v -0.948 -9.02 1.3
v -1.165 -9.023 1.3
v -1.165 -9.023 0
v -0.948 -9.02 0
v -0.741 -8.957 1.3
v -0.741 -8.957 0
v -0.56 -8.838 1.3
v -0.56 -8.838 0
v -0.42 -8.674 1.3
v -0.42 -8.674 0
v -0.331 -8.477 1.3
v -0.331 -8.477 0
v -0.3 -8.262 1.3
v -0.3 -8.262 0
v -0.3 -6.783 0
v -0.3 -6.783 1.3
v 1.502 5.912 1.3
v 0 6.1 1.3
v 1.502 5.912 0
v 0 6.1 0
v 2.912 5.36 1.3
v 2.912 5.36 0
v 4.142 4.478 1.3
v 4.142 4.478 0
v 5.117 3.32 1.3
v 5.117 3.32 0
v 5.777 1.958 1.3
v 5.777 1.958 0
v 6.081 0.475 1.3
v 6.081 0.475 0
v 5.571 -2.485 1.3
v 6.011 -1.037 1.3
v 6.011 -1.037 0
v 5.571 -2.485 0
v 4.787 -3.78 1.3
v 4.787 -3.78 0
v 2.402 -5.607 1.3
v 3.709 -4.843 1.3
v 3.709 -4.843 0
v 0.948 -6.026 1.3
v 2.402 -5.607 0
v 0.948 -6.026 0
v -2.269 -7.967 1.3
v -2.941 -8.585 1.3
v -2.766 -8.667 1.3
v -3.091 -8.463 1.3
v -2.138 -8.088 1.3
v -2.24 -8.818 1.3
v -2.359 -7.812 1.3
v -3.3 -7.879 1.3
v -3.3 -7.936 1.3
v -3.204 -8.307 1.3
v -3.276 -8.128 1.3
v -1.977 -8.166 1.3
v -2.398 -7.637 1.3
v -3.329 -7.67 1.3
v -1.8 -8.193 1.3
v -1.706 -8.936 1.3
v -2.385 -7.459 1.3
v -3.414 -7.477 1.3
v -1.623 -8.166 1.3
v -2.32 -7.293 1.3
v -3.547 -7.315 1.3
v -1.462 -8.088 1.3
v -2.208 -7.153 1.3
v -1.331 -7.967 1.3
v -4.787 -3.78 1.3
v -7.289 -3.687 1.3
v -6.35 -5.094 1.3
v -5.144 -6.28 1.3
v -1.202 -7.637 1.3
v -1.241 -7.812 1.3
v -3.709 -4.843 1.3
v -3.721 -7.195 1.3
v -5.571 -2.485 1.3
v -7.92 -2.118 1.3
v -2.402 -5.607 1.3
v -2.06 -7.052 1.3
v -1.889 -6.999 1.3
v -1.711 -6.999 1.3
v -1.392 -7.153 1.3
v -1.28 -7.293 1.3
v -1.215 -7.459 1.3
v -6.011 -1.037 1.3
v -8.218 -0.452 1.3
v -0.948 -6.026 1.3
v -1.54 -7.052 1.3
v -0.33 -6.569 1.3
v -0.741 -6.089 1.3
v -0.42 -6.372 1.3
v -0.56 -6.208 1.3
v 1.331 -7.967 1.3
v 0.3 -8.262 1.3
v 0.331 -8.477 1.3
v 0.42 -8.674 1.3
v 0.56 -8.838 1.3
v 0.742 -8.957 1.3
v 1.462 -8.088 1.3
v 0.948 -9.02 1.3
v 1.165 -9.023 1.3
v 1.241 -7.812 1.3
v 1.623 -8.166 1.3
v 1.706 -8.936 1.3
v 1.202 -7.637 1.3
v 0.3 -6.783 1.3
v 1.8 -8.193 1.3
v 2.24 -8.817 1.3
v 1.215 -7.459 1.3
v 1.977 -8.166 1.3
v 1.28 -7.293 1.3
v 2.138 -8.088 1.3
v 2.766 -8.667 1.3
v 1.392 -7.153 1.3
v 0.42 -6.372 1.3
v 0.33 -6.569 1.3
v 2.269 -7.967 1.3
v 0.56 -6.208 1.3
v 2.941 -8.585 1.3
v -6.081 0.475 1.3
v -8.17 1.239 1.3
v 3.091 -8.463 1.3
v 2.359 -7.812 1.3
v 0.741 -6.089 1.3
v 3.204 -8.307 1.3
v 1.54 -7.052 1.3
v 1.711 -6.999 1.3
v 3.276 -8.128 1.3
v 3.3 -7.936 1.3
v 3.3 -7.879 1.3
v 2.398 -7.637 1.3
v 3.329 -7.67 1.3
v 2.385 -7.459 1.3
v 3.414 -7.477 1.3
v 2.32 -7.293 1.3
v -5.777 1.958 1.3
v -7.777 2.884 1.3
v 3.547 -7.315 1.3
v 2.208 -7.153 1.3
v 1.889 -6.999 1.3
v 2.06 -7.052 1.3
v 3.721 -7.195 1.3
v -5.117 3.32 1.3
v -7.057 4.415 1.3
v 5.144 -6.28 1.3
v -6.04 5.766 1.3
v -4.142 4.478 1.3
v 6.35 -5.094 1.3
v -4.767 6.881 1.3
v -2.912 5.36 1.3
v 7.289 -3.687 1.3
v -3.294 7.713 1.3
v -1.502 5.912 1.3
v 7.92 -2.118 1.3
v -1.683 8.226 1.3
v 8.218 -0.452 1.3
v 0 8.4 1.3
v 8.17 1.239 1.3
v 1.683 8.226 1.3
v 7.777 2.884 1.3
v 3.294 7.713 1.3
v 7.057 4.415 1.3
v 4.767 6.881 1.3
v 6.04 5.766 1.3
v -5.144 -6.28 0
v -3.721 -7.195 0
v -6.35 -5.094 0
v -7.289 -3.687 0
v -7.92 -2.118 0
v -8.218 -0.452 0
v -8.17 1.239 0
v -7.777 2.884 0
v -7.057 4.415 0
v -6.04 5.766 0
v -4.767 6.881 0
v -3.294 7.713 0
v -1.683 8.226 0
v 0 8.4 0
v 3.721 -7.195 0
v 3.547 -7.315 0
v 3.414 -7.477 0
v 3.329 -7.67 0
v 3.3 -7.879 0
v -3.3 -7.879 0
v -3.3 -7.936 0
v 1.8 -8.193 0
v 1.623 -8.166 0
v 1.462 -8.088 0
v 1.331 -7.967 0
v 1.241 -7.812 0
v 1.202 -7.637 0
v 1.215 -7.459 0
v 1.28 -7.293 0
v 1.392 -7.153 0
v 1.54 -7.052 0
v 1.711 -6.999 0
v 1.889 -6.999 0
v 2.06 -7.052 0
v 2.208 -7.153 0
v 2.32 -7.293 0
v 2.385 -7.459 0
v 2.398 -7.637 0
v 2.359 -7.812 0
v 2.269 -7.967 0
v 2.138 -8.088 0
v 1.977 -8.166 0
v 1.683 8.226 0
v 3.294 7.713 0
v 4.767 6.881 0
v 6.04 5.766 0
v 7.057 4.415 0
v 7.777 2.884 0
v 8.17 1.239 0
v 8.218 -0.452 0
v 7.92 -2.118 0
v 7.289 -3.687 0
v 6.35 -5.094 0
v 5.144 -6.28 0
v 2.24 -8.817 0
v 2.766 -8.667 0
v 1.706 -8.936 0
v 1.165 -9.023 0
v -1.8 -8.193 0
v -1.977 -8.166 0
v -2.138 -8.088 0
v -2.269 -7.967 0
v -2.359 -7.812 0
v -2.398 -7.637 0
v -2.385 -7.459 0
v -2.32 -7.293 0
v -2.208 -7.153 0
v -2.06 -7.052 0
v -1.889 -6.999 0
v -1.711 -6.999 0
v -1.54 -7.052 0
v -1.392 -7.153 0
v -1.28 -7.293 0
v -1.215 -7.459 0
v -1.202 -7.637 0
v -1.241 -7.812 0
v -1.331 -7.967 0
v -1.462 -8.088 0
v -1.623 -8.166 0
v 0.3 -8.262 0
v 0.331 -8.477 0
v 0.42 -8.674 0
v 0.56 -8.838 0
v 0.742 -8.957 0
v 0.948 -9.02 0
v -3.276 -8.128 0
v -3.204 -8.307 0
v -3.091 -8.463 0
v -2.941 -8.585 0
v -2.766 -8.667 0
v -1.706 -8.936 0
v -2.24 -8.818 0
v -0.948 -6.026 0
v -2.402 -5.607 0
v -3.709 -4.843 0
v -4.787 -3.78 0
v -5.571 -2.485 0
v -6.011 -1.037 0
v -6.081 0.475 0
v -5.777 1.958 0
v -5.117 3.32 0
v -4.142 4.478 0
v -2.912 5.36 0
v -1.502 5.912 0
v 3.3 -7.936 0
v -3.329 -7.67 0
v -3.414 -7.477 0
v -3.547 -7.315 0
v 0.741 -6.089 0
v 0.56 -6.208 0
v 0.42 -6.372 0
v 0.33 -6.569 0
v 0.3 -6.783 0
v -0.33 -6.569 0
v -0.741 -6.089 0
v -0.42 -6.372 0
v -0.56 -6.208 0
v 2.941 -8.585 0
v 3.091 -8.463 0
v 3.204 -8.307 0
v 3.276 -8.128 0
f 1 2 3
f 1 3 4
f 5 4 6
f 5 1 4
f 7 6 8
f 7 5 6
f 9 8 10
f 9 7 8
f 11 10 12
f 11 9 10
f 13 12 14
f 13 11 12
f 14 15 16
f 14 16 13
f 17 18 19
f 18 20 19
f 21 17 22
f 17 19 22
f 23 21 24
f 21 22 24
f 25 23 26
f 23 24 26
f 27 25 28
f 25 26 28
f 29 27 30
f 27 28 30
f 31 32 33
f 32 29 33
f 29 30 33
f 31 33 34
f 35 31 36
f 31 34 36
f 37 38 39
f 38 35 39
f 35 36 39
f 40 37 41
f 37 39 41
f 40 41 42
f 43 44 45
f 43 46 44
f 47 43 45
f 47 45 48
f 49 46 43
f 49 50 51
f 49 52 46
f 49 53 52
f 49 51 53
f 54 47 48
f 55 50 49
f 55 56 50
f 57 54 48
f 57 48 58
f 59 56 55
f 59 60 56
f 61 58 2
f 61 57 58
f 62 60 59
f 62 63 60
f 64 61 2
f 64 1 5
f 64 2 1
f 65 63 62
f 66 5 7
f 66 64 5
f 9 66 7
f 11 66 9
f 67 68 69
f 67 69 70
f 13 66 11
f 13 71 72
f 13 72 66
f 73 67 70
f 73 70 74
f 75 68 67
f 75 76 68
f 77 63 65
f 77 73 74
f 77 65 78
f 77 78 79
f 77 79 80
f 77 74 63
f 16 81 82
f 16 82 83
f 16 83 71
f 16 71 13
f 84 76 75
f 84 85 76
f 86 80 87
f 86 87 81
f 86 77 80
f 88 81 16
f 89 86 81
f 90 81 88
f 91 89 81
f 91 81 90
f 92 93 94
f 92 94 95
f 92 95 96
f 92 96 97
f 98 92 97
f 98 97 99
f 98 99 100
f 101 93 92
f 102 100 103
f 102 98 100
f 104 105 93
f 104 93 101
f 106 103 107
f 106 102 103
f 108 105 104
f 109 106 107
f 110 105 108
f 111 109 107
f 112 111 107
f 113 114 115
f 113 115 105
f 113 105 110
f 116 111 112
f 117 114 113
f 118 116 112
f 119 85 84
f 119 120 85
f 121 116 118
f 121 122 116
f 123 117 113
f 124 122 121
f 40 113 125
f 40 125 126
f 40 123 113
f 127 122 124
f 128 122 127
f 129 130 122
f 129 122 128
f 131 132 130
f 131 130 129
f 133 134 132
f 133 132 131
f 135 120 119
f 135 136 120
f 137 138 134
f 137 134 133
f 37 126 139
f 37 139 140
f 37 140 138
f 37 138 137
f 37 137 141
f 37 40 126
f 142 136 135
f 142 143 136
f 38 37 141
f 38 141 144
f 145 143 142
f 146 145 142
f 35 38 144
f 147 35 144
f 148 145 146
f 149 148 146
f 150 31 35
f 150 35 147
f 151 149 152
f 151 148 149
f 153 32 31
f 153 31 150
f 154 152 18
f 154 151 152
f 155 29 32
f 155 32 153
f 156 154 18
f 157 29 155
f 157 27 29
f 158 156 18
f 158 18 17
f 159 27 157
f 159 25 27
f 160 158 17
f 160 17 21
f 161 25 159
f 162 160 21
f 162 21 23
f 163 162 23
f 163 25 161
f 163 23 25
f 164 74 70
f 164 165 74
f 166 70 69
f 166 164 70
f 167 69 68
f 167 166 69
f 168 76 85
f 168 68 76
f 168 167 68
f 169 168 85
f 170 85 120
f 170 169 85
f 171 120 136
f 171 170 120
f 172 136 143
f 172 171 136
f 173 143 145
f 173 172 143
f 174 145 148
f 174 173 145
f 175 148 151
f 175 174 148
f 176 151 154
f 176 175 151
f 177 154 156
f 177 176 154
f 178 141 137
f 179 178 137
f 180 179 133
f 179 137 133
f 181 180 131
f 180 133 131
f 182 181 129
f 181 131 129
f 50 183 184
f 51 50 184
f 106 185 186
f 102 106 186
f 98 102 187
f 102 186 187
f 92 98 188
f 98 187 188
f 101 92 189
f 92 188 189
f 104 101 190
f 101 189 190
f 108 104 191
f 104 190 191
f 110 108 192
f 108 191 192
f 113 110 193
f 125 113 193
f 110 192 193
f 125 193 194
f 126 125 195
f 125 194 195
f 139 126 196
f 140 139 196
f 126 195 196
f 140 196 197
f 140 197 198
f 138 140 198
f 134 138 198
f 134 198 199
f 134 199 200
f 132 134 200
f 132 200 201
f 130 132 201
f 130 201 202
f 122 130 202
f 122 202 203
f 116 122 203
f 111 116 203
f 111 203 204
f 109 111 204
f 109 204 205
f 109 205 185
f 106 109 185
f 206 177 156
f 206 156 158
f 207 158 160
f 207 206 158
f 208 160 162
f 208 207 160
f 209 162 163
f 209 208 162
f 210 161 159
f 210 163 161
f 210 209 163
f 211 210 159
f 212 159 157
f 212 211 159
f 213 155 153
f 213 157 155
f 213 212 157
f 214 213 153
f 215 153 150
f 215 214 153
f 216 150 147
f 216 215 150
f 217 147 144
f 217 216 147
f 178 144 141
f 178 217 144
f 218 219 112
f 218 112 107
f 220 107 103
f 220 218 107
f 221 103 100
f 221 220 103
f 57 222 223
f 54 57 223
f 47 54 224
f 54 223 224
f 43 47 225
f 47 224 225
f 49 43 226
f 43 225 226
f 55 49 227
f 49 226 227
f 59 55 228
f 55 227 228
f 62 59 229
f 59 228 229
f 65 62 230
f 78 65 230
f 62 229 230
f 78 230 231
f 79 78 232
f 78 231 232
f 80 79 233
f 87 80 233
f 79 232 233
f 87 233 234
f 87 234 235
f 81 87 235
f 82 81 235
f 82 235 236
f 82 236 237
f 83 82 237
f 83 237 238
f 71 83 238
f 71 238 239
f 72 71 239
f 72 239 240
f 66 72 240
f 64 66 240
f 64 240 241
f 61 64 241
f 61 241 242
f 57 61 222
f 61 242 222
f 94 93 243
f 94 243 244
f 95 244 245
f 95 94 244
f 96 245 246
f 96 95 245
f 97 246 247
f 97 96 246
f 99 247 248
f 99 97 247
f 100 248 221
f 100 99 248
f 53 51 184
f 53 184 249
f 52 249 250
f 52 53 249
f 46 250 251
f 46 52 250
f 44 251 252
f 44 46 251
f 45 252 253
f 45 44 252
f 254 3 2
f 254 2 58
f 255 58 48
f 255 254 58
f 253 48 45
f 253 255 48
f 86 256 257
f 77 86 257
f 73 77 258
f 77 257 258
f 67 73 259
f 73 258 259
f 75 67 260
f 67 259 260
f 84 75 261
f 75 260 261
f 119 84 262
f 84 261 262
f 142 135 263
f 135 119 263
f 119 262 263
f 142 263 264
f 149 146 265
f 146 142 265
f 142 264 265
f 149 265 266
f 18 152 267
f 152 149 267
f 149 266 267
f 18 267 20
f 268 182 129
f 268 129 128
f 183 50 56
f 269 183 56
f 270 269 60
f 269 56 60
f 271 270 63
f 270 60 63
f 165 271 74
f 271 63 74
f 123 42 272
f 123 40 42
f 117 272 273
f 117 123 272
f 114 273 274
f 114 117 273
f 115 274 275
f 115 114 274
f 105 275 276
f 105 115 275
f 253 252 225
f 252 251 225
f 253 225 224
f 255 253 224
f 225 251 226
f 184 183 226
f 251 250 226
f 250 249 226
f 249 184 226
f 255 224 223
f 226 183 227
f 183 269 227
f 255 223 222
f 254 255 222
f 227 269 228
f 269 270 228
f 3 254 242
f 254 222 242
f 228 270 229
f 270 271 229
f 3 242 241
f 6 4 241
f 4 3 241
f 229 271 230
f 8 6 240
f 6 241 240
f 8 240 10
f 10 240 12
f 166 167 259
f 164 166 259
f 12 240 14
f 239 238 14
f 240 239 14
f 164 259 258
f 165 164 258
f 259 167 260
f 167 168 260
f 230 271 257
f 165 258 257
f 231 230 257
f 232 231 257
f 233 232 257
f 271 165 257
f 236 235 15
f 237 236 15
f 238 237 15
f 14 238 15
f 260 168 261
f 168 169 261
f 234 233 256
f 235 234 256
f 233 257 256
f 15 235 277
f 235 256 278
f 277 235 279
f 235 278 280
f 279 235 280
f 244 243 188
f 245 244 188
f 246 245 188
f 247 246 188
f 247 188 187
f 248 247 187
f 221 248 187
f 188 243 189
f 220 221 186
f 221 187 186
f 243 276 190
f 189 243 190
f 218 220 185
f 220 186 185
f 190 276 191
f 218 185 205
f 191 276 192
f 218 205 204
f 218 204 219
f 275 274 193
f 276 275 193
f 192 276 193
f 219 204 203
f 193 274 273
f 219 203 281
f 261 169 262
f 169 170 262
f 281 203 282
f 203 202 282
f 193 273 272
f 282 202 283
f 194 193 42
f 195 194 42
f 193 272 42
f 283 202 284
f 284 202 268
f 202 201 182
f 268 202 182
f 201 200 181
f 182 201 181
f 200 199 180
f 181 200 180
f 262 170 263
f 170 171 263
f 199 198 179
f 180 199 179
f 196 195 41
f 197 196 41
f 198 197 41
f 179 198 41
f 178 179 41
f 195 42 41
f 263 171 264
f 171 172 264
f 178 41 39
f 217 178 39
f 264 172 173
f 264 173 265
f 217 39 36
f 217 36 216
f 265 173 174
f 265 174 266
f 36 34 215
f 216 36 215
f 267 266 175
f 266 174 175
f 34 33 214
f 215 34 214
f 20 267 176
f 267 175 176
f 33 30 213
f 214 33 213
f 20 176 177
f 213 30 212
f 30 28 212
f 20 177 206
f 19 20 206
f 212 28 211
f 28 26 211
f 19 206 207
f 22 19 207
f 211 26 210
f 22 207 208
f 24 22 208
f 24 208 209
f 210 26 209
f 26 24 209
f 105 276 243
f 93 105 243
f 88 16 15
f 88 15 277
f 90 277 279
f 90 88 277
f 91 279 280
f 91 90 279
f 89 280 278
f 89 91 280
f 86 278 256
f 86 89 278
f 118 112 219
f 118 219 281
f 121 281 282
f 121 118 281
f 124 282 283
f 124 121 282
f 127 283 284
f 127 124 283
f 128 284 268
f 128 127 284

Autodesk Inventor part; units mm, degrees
ref_plane "YZ Plane" through (0, 0, 0) normal (1, 0, 0) x (0, 1, 0)
ref_plane "XZ Plane" through (0, 0, 0) normal (0, 1, 0) x (-1, 0, 0)
ref_plane "XY Plane" through (0, 0, 0) normal (0, 0, 1) x (1, 0, 0)
sketch "Sketch1" plane through (0, 0, 0) normal (0, 0, 1) x (1, 0, 0)
  arc A0 (0, 6.1) -> (-0.3, -6.0926) centre (0, 0) ccw
  line L0 (0, -10.4012) -> (0, 10.52) projected
  line L1 (-0.3, -6.0926) -> (-0.3, -9.0926)
  arc A1 (-3.3, -8.478) -> (-0.3, -9.0926) centre (0, 0) ccw
  arc A2 (0, 8.4) -> (-3.3, -7.3926) centre (0, 0.1589) ccw
  line L2 (-3.3, -7.3926) -> (-3.3, -8.478)
  line L3 (0, 8.4) -> (0, 6.1)
  arc A3 (0.3, -6.0926) -> (0, 6.1) centre (0, 0) ccw
  line L4 (0.3, -6.0926) -> (0.3, -9.0926)
  arc A4 (0.3, -9.0926) -> (3.3, -8.478) centre (0, 0) ccw
  arc A5 (3.3, -7.3926) -> (0, 8.4) centre (0, 0.1589) ccw
  line L5 (3.3, -7.3926) -> (3.3, -8.478)
  line L6 (0, 8.4) -> (0, 6.1)
  dimension "d0" = 12.2
  dimension "d11" = 3
  dimension "d21" = 0.3
  dimension "d22" = 3
  dimension "d25" = 2.3
  dimension "d26" = 1.3
extrude "Extrusion1" add sketch "Sketch1" along normal blind 1.3
sketch "Sketch3" plane through (0, 0, 1.3) normal (0, 0, 1) x (1, 0, 0)
  line L0 (-0.3, -6.0926) -> (-0.3, -9.0926) projected
  line L1 (0, -12.5911) -> (0, 11.8985) projected
  point P0 (-1.8, -7.5926)
  point P1 (1.8, -7.5926)
  dimension "d30" = 1.5
  dimension "d31" = 1.5
hole "Hole1" at (-1.8, -7.5926, 1.3) at (1.8, -7.5926, 1.3) direction (0, 0, -1) diameter 1.2 end through all
fillet "Fillet1" radius 0.7667 8 edges at (0.3, -6.0926, 0.65) (-0.3, -6.0926, 0.65) (0.3, -9.0926, 0.65) (3.3, -8.478, 0.65) (-3.3, -8.478, 0.65) (-3.3, -7.3926, 0.65) (-0.3, -9.0926, 0.65) (3.3, -7.3926, 0.65)
equation "\"d30\" = 0.5 * ParA"
equation "\"d31\" = 0.5 * ParA"
equation "\"d32\" = Diam5"
equation "\"d39\" = 0.333333 * b"
equation "\"d0\" = Dg"
equation "\"d11\" = ParA"
equation "\"d21\" = 0.1 * ParA"
equation "\"d22\" = ParA"
equation "\"d25\" = b"
equation "\"d26\" = ParJ"
equation "\"d27\" = tt"
equation "\"b\" = 2.3"
equation "\"Dg\" = 12.2"
equation "\"ParJ\" = 1.3"
equation "\"ParA\" = 3"
equation "\"tt\" = 1.3"
equation "\"Diam5\" = 1.2"
equation "\"TEMPLATE\" = 1.2345"
properties part number "ANSI B27.8M - 3DM1-3DM1-13" material "Steel, Mild"
